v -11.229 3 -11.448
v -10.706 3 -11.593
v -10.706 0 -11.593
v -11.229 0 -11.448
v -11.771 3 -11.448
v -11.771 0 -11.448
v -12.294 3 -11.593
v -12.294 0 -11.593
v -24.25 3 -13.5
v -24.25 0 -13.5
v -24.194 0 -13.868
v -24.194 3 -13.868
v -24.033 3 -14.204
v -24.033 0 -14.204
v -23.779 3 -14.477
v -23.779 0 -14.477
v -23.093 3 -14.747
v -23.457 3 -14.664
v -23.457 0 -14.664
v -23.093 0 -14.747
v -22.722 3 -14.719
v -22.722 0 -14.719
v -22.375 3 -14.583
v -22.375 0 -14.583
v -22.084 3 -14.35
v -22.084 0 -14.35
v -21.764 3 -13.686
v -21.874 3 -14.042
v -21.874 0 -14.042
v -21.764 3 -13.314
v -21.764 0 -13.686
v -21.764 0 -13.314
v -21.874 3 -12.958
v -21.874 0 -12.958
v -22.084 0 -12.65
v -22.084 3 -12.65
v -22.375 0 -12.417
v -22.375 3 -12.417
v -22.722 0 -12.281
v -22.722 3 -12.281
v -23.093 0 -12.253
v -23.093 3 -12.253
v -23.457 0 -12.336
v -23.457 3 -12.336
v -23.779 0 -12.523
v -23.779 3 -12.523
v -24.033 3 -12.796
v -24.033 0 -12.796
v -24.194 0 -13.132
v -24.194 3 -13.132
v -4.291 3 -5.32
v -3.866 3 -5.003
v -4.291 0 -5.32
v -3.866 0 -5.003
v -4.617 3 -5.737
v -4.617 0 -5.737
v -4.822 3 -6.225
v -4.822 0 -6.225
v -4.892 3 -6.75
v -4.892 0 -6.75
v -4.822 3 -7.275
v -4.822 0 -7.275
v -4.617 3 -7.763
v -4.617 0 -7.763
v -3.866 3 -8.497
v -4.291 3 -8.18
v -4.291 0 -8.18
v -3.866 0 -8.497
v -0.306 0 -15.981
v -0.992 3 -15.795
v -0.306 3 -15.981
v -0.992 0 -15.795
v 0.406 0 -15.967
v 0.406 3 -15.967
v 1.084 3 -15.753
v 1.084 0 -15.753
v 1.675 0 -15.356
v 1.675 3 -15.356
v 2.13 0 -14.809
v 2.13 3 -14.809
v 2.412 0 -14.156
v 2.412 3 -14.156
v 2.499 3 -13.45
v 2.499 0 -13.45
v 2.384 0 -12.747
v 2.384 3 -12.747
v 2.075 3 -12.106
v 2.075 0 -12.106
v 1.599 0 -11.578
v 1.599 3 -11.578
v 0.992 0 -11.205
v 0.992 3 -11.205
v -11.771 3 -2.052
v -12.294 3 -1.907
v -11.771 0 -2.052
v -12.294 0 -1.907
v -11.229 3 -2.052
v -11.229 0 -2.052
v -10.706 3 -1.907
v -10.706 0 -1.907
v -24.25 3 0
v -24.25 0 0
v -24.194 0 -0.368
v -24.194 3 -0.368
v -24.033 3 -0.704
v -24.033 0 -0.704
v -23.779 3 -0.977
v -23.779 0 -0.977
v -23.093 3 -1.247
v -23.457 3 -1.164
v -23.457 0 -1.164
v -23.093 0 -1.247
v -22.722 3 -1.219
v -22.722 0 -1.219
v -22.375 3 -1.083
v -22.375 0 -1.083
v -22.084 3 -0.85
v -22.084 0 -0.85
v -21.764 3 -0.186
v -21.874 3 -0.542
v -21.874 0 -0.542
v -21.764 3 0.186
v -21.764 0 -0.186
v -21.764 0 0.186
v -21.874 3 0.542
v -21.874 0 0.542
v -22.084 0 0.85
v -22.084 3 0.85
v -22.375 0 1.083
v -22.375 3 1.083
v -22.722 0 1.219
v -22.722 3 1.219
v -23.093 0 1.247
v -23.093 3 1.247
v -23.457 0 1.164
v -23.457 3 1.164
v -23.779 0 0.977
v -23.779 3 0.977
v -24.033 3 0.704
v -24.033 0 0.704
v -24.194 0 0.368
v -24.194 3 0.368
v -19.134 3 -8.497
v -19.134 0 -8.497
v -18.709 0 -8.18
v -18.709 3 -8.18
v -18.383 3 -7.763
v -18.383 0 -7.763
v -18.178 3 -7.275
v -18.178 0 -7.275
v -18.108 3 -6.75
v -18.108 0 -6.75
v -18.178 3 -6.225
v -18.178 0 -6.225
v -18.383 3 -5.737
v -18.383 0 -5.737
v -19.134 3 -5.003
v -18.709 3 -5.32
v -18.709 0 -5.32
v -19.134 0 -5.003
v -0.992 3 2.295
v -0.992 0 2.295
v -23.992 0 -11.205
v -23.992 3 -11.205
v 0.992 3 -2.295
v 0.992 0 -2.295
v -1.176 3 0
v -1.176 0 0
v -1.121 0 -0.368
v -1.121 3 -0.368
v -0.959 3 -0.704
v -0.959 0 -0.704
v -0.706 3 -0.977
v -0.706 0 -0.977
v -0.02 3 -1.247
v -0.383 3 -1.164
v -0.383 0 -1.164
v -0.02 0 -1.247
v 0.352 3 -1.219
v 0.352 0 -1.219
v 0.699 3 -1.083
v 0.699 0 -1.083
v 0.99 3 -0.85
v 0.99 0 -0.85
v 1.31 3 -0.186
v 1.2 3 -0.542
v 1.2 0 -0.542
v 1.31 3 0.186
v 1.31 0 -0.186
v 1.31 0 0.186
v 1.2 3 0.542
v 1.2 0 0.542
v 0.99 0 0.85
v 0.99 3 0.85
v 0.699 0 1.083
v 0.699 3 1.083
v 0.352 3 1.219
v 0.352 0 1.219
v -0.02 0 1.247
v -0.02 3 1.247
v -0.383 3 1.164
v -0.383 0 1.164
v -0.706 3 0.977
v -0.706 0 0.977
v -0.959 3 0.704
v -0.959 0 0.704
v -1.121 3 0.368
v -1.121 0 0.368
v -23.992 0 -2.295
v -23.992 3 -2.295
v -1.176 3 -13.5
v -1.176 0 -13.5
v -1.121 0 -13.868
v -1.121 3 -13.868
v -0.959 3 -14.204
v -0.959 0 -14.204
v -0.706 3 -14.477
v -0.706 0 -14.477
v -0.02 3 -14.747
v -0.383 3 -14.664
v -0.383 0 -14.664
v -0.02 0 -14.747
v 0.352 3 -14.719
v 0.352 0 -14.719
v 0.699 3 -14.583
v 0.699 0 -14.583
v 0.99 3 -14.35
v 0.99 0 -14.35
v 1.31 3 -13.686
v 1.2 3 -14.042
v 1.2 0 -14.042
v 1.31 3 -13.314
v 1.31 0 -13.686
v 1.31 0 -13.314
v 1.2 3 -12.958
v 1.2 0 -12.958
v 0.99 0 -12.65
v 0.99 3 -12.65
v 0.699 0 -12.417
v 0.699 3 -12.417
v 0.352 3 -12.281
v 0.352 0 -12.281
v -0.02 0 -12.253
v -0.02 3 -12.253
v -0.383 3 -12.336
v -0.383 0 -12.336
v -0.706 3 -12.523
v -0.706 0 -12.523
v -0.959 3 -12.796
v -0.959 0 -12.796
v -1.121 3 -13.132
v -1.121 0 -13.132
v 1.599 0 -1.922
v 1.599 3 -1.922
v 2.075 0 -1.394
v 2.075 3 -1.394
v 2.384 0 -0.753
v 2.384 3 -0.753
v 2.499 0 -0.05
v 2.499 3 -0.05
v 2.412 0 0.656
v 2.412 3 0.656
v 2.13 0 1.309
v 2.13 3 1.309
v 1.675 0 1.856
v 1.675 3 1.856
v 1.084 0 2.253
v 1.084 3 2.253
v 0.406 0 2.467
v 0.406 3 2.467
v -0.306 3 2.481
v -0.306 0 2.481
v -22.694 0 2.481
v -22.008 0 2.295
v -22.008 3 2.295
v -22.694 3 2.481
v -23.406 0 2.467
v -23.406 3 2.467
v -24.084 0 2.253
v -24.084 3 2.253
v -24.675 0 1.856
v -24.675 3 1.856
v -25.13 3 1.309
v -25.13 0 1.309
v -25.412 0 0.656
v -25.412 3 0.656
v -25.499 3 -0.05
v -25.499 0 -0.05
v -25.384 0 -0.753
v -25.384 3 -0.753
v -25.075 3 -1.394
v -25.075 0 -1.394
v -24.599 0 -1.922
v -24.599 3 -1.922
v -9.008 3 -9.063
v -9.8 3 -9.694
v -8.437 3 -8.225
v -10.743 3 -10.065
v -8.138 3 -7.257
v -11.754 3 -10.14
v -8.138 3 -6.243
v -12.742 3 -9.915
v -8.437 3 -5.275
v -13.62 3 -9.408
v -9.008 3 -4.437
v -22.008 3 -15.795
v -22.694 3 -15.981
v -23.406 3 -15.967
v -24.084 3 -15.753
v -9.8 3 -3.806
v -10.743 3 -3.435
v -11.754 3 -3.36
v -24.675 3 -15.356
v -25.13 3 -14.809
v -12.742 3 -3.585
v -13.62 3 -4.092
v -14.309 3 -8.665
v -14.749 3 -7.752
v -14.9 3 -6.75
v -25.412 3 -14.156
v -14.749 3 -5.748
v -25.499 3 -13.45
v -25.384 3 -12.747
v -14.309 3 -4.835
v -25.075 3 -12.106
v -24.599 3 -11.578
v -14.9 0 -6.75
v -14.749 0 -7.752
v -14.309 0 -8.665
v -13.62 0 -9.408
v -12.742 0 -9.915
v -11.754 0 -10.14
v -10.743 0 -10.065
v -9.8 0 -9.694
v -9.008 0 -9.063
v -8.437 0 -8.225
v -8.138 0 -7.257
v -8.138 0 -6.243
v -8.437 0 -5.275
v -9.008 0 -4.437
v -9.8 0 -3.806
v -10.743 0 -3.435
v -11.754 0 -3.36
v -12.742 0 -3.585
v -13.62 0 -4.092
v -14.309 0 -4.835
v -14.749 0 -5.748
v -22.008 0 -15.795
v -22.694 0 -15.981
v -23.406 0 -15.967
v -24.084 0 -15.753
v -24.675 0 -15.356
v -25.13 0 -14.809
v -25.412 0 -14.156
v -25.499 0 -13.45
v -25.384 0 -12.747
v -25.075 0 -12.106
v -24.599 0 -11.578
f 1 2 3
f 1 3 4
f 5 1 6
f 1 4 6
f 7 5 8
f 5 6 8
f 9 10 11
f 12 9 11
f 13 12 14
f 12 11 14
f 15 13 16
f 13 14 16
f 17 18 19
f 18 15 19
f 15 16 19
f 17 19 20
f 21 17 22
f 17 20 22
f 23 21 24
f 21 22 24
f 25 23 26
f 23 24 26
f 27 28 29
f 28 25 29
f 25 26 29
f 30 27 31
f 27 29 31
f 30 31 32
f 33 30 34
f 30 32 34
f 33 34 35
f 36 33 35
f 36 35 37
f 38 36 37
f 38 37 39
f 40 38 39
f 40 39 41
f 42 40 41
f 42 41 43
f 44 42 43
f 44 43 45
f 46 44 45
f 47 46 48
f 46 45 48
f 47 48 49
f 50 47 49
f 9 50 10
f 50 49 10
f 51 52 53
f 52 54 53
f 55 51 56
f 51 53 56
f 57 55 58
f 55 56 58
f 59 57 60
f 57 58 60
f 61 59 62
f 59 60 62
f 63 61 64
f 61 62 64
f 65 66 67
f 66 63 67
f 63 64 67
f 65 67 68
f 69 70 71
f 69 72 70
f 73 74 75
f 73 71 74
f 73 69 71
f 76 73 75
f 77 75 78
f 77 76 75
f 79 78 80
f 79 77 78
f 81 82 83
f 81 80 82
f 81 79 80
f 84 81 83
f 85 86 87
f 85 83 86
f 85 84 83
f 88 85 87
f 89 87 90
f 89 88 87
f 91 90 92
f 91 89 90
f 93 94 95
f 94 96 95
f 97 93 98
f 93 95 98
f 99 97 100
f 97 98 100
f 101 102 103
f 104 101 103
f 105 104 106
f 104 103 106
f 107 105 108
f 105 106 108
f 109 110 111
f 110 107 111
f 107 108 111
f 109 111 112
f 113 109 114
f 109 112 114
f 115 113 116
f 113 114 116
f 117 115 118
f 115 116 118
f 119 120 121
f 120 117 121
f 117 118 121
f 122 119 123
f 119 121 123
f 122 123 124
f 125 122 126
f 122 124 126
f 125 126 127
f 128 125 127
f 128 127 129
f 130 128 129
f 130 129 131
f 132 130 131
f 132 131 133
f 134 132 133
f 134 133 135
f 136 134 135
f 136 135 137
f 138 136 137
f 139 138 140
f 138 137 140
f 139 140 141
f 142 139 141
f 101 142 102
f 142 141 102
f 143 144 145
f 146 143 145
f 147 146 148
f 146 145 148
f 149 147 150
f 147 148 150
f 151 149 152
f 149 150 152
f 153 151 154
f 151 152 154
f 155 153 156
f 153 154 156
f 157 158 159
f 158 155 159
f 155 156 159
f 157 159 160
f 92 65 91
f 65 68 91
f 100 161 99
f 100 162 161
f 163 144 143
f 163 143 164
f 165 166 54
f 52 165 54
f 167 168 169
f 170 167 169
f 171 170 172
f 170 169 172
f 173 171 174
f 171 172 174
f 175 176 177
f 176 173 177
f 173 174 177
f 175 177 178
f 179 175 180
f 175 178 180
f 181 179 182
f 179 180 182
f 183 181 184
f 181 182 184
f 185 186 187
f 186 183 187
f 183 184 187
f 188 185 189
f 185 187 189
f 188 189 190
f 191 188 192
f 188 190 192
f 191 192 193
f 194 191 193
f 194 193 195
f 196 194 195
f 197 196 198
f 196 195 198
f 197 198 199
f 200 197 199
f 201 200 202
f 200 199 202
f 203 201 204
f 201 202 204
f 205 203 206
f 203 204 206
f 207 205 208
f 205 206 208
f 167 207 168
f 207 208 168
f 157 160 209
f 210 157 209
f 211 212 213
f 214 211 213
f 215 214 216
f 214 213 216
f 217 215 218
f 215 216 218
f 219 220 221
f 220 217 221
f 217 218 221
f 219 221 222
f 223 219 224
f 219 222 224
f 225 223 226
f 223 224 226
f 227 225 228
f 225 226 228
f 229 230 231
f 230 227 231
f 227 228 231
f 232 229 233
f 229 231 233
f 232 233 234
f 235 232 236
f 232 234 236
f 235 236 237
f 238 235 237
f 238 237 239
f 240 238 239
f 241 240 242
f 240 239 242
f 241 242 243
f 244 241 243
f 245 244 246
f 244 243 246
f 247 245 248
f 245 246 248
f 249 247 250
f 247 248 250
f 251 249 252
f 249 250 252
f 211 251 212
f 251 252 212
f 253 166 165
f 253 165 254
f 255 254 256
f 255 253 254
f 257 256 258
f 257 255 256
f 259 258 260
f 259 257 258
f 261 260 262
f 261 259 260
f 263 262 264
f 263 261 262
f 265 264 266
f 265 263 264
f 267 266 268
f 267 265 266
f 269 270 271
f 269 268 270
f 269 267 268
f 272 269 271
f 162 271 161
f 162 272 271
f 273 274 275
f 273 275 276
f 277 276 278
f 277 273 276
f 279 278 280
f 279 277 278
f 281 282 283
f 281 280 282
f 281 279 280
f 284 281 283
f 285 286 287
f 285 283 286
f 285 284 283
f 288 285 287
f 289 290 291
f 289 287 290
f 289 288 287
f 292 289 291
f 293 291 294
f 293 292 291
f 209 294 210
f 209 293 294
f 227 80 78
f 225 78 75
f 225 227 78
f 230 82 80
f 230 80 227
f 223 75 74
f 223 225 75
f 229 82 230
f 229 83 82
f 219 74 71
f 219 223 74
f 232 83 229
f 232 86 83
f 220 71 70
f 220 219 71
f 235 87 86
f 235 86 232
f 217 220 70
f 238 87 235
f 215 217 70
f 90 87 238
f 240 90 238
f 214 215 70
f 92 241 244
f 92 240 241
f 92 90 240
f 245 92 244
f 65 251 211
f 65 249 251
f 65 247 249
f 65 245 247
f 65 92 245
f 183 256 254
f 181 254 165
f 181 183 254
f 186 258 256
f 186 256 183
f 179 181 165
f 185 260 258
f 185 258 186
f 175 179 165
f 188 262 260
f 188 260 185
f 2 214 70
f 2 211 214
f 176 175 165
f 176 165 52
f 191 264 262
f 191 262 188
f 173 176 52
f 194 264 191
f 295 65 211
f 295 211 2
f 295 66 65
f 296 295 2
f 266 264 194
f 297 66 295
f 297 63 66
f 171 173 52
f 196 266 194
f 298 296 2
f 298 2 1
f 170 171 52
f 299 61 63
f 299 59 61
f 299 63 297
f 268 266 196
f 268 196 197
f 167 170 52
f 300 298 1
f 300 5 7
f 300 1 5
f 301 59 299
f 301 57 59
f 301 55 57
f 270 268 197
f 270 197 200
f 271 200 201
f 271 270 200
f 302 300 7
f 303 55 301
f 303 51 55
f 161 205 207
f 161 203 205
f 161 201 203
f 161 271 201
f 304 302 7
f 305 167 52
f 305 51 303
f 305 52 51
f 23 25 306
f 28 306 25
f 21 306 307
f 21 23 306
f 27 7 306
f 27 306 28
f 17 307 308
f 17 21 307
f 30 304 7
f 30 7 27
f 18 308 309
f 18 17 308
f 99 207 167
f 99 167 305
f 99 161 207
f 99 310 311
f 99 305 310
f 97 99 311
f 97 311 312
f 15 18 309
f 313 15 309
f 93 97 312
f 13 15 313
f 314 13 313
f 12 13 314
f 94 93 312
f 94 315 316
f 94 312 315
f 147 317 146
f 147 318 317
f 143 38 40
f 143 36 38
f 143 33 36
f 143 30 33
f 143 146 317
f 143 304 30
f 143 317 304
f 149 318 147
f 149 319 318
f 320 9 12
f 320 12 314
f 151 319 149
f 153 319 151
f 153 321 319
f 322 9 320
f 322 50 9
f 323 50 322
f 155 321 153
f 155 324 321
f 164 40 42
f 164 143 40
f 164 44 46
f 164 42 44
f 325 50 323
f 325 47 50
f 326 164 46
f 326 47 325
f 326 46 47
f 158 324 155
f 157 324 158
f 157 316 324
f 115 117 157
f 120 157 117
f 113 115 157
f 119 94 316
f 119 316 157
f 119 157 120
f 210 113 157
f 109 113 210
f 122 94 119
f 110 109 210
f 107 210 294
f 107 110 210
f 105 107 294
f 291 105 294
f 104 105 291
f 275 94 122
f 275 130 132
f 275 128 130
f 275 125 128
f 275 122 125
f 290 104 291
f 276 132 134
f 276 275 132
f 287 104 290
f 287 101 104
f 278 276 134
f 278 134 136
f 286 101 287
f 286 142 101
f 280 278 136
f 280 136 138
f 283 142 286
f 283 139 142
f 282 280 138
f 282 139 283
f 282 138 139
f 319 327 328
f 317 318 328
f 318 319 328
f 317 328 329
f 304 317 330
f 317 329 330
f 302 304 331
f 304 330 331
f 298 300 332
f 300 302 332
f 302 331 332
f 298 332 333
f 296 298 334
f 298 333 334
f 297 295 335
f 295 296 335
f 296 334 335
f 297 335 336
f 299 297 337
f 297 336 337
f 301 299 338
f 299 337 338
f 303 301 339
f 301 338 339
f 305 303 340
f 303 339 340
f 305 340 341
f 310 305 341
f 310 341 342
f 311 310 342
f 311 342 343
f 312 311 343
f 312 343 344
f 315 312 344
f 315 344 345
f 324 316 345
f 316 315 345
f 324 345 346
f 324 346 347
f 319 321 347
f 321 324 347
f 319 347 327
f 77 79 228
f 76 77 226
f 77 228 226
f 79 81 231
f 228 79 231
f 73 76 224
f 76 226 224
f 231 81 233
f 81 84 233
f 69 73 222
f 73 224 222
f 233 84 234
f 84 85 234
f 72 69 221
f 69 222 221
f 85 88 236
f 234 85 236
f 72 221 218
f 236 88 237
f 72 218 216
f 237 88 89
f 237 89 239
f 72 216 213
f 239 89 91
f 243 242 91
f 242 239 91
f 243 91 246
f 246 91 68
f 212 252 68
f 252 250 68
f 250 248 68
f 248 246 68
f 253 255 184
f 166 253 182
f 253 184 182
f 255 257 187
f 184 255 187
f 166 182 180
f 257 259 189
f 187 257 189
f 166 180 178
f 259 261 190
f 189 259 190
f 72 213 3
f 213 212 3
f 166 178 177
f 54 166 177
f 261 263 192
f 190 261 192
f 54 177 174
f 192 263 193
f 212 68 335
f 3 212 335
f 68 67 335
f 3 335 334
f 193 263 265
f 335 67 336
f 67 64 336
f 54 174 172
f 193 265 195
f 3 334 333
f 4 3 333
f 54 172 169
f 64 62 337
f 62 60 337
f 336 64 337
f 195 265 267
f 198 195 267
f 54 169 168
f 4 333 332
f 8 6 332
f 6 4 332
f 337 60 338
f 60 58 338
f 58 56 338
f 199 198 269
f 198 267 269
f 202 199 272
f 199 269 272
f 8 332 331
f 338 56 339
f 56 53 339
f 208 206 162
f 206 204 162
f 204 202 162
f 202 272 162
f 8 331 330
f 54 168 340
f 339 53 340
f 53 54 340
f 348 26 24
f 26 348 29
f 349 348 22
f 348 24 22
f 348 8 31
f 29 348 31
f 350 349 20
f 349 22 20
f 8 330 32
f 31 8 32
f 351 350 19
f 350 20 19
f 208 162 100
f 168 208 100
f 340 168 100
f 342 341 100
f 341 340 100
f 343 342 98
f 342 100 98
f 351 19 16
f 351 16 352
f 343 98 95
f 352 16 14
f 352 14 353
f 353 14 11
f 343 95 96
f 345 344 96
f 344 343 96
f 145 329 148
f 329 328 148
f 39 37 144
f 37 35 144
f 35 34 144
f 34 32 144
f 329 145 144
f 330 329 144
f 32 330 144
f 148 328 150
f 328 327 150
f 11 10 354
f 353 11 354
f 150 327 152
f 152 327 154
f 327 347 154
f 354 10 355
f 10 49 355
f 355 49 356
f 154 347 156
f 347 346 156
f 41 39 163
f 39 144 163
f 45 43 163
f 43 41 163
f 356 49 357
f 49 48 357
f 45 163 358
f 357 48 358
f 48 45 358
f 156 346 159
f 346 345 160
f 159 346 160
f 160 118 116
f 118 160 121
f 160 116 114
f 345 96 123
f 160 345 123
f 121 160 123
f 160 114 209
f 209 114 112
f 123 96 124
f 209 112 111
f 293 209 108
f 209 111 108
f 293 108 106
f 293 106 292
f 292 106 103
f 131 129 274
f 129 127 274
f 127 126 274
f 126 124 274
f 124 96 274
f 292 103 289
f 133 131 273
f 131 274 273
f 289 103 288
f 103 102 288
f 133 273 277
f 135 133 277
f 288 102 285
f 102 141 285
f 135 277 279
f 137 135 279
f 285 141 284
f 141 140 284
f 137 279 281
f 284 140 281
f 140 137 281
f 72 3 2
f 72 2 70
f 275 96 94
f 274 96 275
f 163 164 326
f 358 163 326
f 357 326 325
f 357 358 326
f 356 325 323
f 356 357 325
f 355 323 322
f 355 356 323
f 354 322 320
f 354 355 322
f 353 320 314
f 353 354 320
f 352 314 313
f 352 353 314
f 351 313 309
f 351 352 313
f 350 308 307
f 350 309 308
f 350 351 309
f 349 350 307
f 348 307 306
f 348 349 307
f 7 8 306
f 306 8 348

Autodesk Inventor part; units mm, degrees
ref_plane "YZ Plane" through (0, 0, 0) normal (1, 0, 0) x (0, 1, 0)
ref_plane "XZ Plane" through (0, 0, 0) normal (0, 1, 0) x (-1, 0, 0)
ref_plane "XY Plane" through (0, 0, 0) normal (0, 0, 1) x (1, 0, 0)
sketch "Boceto1" plane through (0, 0, 0) normal (0, 1, 0) x (-1, 0, 0)
  arc A0 (22.0076, -15.7946) -> (23.9924, -11.2054) centre (23, -13.5) ccw
  arc A1 (23.9924, -2.2946) -> (22.0076, 2.2946) centre (23, 0) ccw
  arc A2 (0.9924, 2.2946) -> (-0.9924, -2.2946) centre (0, 0) ccw
  arc A3 (-0.9924, -11.2054) -> (0.9924, -15.7946) centre (0, -13.5) ccw
  line L0 (12.2939, -1.9066) -> (22.0076, 2.2946)
  line L1 (19.1337, -5.0031) -> (23.9924, -2.2946)
  line L2 (19.1337, -8.4969) -> (23.9924, -11.2054)
  line L3 (0.9924, 2.2946) -> (10.7061, -1.9066)
  line L4 (-0.9924, -2.2946) -> (3.8663, -5.0031)
  line L5 (3.8663, -8.4969) -> (-0.9924, -11.2054)
  line L6 (12.2939, -11.5934) -> (22.0076, -15.7946)
  line L7 (10.7061, -11.5934) -> (0.9924, -15.7946)
  circle A4 centre (11.5, -6.75) radius 3.4
  arc A5 (19.1337, -5.0031) -> (19.1337, -8.4969) centre (20.1075, -6.75) ccw
  arc A6 (10.7061, -1.9066) -> (12.2939, -1.9066) centre (11.5, -0.071) ccw
  arc A7 (3.8663, -8.4969) -> (3.8663, -5.0031) centre (2.8925, -6.75) ccw
  arc A8 (12.2939, -11.5934) -> (10.7061, -11.5934) centre (11.5, -13.429) ccw
  circle A9 centre (23, 0) radius 1.25
  circle A10 centre (23, -13.5) radius 1.25
  circle A11 centre (-0.0735, 0) radius 1.25
  circle A12 centre (-0.0735, -13.5) radius 1.25
extrude "Extrusión1" add sketch "Boceto1" along normal blind 3
properties part number "Extension2"
